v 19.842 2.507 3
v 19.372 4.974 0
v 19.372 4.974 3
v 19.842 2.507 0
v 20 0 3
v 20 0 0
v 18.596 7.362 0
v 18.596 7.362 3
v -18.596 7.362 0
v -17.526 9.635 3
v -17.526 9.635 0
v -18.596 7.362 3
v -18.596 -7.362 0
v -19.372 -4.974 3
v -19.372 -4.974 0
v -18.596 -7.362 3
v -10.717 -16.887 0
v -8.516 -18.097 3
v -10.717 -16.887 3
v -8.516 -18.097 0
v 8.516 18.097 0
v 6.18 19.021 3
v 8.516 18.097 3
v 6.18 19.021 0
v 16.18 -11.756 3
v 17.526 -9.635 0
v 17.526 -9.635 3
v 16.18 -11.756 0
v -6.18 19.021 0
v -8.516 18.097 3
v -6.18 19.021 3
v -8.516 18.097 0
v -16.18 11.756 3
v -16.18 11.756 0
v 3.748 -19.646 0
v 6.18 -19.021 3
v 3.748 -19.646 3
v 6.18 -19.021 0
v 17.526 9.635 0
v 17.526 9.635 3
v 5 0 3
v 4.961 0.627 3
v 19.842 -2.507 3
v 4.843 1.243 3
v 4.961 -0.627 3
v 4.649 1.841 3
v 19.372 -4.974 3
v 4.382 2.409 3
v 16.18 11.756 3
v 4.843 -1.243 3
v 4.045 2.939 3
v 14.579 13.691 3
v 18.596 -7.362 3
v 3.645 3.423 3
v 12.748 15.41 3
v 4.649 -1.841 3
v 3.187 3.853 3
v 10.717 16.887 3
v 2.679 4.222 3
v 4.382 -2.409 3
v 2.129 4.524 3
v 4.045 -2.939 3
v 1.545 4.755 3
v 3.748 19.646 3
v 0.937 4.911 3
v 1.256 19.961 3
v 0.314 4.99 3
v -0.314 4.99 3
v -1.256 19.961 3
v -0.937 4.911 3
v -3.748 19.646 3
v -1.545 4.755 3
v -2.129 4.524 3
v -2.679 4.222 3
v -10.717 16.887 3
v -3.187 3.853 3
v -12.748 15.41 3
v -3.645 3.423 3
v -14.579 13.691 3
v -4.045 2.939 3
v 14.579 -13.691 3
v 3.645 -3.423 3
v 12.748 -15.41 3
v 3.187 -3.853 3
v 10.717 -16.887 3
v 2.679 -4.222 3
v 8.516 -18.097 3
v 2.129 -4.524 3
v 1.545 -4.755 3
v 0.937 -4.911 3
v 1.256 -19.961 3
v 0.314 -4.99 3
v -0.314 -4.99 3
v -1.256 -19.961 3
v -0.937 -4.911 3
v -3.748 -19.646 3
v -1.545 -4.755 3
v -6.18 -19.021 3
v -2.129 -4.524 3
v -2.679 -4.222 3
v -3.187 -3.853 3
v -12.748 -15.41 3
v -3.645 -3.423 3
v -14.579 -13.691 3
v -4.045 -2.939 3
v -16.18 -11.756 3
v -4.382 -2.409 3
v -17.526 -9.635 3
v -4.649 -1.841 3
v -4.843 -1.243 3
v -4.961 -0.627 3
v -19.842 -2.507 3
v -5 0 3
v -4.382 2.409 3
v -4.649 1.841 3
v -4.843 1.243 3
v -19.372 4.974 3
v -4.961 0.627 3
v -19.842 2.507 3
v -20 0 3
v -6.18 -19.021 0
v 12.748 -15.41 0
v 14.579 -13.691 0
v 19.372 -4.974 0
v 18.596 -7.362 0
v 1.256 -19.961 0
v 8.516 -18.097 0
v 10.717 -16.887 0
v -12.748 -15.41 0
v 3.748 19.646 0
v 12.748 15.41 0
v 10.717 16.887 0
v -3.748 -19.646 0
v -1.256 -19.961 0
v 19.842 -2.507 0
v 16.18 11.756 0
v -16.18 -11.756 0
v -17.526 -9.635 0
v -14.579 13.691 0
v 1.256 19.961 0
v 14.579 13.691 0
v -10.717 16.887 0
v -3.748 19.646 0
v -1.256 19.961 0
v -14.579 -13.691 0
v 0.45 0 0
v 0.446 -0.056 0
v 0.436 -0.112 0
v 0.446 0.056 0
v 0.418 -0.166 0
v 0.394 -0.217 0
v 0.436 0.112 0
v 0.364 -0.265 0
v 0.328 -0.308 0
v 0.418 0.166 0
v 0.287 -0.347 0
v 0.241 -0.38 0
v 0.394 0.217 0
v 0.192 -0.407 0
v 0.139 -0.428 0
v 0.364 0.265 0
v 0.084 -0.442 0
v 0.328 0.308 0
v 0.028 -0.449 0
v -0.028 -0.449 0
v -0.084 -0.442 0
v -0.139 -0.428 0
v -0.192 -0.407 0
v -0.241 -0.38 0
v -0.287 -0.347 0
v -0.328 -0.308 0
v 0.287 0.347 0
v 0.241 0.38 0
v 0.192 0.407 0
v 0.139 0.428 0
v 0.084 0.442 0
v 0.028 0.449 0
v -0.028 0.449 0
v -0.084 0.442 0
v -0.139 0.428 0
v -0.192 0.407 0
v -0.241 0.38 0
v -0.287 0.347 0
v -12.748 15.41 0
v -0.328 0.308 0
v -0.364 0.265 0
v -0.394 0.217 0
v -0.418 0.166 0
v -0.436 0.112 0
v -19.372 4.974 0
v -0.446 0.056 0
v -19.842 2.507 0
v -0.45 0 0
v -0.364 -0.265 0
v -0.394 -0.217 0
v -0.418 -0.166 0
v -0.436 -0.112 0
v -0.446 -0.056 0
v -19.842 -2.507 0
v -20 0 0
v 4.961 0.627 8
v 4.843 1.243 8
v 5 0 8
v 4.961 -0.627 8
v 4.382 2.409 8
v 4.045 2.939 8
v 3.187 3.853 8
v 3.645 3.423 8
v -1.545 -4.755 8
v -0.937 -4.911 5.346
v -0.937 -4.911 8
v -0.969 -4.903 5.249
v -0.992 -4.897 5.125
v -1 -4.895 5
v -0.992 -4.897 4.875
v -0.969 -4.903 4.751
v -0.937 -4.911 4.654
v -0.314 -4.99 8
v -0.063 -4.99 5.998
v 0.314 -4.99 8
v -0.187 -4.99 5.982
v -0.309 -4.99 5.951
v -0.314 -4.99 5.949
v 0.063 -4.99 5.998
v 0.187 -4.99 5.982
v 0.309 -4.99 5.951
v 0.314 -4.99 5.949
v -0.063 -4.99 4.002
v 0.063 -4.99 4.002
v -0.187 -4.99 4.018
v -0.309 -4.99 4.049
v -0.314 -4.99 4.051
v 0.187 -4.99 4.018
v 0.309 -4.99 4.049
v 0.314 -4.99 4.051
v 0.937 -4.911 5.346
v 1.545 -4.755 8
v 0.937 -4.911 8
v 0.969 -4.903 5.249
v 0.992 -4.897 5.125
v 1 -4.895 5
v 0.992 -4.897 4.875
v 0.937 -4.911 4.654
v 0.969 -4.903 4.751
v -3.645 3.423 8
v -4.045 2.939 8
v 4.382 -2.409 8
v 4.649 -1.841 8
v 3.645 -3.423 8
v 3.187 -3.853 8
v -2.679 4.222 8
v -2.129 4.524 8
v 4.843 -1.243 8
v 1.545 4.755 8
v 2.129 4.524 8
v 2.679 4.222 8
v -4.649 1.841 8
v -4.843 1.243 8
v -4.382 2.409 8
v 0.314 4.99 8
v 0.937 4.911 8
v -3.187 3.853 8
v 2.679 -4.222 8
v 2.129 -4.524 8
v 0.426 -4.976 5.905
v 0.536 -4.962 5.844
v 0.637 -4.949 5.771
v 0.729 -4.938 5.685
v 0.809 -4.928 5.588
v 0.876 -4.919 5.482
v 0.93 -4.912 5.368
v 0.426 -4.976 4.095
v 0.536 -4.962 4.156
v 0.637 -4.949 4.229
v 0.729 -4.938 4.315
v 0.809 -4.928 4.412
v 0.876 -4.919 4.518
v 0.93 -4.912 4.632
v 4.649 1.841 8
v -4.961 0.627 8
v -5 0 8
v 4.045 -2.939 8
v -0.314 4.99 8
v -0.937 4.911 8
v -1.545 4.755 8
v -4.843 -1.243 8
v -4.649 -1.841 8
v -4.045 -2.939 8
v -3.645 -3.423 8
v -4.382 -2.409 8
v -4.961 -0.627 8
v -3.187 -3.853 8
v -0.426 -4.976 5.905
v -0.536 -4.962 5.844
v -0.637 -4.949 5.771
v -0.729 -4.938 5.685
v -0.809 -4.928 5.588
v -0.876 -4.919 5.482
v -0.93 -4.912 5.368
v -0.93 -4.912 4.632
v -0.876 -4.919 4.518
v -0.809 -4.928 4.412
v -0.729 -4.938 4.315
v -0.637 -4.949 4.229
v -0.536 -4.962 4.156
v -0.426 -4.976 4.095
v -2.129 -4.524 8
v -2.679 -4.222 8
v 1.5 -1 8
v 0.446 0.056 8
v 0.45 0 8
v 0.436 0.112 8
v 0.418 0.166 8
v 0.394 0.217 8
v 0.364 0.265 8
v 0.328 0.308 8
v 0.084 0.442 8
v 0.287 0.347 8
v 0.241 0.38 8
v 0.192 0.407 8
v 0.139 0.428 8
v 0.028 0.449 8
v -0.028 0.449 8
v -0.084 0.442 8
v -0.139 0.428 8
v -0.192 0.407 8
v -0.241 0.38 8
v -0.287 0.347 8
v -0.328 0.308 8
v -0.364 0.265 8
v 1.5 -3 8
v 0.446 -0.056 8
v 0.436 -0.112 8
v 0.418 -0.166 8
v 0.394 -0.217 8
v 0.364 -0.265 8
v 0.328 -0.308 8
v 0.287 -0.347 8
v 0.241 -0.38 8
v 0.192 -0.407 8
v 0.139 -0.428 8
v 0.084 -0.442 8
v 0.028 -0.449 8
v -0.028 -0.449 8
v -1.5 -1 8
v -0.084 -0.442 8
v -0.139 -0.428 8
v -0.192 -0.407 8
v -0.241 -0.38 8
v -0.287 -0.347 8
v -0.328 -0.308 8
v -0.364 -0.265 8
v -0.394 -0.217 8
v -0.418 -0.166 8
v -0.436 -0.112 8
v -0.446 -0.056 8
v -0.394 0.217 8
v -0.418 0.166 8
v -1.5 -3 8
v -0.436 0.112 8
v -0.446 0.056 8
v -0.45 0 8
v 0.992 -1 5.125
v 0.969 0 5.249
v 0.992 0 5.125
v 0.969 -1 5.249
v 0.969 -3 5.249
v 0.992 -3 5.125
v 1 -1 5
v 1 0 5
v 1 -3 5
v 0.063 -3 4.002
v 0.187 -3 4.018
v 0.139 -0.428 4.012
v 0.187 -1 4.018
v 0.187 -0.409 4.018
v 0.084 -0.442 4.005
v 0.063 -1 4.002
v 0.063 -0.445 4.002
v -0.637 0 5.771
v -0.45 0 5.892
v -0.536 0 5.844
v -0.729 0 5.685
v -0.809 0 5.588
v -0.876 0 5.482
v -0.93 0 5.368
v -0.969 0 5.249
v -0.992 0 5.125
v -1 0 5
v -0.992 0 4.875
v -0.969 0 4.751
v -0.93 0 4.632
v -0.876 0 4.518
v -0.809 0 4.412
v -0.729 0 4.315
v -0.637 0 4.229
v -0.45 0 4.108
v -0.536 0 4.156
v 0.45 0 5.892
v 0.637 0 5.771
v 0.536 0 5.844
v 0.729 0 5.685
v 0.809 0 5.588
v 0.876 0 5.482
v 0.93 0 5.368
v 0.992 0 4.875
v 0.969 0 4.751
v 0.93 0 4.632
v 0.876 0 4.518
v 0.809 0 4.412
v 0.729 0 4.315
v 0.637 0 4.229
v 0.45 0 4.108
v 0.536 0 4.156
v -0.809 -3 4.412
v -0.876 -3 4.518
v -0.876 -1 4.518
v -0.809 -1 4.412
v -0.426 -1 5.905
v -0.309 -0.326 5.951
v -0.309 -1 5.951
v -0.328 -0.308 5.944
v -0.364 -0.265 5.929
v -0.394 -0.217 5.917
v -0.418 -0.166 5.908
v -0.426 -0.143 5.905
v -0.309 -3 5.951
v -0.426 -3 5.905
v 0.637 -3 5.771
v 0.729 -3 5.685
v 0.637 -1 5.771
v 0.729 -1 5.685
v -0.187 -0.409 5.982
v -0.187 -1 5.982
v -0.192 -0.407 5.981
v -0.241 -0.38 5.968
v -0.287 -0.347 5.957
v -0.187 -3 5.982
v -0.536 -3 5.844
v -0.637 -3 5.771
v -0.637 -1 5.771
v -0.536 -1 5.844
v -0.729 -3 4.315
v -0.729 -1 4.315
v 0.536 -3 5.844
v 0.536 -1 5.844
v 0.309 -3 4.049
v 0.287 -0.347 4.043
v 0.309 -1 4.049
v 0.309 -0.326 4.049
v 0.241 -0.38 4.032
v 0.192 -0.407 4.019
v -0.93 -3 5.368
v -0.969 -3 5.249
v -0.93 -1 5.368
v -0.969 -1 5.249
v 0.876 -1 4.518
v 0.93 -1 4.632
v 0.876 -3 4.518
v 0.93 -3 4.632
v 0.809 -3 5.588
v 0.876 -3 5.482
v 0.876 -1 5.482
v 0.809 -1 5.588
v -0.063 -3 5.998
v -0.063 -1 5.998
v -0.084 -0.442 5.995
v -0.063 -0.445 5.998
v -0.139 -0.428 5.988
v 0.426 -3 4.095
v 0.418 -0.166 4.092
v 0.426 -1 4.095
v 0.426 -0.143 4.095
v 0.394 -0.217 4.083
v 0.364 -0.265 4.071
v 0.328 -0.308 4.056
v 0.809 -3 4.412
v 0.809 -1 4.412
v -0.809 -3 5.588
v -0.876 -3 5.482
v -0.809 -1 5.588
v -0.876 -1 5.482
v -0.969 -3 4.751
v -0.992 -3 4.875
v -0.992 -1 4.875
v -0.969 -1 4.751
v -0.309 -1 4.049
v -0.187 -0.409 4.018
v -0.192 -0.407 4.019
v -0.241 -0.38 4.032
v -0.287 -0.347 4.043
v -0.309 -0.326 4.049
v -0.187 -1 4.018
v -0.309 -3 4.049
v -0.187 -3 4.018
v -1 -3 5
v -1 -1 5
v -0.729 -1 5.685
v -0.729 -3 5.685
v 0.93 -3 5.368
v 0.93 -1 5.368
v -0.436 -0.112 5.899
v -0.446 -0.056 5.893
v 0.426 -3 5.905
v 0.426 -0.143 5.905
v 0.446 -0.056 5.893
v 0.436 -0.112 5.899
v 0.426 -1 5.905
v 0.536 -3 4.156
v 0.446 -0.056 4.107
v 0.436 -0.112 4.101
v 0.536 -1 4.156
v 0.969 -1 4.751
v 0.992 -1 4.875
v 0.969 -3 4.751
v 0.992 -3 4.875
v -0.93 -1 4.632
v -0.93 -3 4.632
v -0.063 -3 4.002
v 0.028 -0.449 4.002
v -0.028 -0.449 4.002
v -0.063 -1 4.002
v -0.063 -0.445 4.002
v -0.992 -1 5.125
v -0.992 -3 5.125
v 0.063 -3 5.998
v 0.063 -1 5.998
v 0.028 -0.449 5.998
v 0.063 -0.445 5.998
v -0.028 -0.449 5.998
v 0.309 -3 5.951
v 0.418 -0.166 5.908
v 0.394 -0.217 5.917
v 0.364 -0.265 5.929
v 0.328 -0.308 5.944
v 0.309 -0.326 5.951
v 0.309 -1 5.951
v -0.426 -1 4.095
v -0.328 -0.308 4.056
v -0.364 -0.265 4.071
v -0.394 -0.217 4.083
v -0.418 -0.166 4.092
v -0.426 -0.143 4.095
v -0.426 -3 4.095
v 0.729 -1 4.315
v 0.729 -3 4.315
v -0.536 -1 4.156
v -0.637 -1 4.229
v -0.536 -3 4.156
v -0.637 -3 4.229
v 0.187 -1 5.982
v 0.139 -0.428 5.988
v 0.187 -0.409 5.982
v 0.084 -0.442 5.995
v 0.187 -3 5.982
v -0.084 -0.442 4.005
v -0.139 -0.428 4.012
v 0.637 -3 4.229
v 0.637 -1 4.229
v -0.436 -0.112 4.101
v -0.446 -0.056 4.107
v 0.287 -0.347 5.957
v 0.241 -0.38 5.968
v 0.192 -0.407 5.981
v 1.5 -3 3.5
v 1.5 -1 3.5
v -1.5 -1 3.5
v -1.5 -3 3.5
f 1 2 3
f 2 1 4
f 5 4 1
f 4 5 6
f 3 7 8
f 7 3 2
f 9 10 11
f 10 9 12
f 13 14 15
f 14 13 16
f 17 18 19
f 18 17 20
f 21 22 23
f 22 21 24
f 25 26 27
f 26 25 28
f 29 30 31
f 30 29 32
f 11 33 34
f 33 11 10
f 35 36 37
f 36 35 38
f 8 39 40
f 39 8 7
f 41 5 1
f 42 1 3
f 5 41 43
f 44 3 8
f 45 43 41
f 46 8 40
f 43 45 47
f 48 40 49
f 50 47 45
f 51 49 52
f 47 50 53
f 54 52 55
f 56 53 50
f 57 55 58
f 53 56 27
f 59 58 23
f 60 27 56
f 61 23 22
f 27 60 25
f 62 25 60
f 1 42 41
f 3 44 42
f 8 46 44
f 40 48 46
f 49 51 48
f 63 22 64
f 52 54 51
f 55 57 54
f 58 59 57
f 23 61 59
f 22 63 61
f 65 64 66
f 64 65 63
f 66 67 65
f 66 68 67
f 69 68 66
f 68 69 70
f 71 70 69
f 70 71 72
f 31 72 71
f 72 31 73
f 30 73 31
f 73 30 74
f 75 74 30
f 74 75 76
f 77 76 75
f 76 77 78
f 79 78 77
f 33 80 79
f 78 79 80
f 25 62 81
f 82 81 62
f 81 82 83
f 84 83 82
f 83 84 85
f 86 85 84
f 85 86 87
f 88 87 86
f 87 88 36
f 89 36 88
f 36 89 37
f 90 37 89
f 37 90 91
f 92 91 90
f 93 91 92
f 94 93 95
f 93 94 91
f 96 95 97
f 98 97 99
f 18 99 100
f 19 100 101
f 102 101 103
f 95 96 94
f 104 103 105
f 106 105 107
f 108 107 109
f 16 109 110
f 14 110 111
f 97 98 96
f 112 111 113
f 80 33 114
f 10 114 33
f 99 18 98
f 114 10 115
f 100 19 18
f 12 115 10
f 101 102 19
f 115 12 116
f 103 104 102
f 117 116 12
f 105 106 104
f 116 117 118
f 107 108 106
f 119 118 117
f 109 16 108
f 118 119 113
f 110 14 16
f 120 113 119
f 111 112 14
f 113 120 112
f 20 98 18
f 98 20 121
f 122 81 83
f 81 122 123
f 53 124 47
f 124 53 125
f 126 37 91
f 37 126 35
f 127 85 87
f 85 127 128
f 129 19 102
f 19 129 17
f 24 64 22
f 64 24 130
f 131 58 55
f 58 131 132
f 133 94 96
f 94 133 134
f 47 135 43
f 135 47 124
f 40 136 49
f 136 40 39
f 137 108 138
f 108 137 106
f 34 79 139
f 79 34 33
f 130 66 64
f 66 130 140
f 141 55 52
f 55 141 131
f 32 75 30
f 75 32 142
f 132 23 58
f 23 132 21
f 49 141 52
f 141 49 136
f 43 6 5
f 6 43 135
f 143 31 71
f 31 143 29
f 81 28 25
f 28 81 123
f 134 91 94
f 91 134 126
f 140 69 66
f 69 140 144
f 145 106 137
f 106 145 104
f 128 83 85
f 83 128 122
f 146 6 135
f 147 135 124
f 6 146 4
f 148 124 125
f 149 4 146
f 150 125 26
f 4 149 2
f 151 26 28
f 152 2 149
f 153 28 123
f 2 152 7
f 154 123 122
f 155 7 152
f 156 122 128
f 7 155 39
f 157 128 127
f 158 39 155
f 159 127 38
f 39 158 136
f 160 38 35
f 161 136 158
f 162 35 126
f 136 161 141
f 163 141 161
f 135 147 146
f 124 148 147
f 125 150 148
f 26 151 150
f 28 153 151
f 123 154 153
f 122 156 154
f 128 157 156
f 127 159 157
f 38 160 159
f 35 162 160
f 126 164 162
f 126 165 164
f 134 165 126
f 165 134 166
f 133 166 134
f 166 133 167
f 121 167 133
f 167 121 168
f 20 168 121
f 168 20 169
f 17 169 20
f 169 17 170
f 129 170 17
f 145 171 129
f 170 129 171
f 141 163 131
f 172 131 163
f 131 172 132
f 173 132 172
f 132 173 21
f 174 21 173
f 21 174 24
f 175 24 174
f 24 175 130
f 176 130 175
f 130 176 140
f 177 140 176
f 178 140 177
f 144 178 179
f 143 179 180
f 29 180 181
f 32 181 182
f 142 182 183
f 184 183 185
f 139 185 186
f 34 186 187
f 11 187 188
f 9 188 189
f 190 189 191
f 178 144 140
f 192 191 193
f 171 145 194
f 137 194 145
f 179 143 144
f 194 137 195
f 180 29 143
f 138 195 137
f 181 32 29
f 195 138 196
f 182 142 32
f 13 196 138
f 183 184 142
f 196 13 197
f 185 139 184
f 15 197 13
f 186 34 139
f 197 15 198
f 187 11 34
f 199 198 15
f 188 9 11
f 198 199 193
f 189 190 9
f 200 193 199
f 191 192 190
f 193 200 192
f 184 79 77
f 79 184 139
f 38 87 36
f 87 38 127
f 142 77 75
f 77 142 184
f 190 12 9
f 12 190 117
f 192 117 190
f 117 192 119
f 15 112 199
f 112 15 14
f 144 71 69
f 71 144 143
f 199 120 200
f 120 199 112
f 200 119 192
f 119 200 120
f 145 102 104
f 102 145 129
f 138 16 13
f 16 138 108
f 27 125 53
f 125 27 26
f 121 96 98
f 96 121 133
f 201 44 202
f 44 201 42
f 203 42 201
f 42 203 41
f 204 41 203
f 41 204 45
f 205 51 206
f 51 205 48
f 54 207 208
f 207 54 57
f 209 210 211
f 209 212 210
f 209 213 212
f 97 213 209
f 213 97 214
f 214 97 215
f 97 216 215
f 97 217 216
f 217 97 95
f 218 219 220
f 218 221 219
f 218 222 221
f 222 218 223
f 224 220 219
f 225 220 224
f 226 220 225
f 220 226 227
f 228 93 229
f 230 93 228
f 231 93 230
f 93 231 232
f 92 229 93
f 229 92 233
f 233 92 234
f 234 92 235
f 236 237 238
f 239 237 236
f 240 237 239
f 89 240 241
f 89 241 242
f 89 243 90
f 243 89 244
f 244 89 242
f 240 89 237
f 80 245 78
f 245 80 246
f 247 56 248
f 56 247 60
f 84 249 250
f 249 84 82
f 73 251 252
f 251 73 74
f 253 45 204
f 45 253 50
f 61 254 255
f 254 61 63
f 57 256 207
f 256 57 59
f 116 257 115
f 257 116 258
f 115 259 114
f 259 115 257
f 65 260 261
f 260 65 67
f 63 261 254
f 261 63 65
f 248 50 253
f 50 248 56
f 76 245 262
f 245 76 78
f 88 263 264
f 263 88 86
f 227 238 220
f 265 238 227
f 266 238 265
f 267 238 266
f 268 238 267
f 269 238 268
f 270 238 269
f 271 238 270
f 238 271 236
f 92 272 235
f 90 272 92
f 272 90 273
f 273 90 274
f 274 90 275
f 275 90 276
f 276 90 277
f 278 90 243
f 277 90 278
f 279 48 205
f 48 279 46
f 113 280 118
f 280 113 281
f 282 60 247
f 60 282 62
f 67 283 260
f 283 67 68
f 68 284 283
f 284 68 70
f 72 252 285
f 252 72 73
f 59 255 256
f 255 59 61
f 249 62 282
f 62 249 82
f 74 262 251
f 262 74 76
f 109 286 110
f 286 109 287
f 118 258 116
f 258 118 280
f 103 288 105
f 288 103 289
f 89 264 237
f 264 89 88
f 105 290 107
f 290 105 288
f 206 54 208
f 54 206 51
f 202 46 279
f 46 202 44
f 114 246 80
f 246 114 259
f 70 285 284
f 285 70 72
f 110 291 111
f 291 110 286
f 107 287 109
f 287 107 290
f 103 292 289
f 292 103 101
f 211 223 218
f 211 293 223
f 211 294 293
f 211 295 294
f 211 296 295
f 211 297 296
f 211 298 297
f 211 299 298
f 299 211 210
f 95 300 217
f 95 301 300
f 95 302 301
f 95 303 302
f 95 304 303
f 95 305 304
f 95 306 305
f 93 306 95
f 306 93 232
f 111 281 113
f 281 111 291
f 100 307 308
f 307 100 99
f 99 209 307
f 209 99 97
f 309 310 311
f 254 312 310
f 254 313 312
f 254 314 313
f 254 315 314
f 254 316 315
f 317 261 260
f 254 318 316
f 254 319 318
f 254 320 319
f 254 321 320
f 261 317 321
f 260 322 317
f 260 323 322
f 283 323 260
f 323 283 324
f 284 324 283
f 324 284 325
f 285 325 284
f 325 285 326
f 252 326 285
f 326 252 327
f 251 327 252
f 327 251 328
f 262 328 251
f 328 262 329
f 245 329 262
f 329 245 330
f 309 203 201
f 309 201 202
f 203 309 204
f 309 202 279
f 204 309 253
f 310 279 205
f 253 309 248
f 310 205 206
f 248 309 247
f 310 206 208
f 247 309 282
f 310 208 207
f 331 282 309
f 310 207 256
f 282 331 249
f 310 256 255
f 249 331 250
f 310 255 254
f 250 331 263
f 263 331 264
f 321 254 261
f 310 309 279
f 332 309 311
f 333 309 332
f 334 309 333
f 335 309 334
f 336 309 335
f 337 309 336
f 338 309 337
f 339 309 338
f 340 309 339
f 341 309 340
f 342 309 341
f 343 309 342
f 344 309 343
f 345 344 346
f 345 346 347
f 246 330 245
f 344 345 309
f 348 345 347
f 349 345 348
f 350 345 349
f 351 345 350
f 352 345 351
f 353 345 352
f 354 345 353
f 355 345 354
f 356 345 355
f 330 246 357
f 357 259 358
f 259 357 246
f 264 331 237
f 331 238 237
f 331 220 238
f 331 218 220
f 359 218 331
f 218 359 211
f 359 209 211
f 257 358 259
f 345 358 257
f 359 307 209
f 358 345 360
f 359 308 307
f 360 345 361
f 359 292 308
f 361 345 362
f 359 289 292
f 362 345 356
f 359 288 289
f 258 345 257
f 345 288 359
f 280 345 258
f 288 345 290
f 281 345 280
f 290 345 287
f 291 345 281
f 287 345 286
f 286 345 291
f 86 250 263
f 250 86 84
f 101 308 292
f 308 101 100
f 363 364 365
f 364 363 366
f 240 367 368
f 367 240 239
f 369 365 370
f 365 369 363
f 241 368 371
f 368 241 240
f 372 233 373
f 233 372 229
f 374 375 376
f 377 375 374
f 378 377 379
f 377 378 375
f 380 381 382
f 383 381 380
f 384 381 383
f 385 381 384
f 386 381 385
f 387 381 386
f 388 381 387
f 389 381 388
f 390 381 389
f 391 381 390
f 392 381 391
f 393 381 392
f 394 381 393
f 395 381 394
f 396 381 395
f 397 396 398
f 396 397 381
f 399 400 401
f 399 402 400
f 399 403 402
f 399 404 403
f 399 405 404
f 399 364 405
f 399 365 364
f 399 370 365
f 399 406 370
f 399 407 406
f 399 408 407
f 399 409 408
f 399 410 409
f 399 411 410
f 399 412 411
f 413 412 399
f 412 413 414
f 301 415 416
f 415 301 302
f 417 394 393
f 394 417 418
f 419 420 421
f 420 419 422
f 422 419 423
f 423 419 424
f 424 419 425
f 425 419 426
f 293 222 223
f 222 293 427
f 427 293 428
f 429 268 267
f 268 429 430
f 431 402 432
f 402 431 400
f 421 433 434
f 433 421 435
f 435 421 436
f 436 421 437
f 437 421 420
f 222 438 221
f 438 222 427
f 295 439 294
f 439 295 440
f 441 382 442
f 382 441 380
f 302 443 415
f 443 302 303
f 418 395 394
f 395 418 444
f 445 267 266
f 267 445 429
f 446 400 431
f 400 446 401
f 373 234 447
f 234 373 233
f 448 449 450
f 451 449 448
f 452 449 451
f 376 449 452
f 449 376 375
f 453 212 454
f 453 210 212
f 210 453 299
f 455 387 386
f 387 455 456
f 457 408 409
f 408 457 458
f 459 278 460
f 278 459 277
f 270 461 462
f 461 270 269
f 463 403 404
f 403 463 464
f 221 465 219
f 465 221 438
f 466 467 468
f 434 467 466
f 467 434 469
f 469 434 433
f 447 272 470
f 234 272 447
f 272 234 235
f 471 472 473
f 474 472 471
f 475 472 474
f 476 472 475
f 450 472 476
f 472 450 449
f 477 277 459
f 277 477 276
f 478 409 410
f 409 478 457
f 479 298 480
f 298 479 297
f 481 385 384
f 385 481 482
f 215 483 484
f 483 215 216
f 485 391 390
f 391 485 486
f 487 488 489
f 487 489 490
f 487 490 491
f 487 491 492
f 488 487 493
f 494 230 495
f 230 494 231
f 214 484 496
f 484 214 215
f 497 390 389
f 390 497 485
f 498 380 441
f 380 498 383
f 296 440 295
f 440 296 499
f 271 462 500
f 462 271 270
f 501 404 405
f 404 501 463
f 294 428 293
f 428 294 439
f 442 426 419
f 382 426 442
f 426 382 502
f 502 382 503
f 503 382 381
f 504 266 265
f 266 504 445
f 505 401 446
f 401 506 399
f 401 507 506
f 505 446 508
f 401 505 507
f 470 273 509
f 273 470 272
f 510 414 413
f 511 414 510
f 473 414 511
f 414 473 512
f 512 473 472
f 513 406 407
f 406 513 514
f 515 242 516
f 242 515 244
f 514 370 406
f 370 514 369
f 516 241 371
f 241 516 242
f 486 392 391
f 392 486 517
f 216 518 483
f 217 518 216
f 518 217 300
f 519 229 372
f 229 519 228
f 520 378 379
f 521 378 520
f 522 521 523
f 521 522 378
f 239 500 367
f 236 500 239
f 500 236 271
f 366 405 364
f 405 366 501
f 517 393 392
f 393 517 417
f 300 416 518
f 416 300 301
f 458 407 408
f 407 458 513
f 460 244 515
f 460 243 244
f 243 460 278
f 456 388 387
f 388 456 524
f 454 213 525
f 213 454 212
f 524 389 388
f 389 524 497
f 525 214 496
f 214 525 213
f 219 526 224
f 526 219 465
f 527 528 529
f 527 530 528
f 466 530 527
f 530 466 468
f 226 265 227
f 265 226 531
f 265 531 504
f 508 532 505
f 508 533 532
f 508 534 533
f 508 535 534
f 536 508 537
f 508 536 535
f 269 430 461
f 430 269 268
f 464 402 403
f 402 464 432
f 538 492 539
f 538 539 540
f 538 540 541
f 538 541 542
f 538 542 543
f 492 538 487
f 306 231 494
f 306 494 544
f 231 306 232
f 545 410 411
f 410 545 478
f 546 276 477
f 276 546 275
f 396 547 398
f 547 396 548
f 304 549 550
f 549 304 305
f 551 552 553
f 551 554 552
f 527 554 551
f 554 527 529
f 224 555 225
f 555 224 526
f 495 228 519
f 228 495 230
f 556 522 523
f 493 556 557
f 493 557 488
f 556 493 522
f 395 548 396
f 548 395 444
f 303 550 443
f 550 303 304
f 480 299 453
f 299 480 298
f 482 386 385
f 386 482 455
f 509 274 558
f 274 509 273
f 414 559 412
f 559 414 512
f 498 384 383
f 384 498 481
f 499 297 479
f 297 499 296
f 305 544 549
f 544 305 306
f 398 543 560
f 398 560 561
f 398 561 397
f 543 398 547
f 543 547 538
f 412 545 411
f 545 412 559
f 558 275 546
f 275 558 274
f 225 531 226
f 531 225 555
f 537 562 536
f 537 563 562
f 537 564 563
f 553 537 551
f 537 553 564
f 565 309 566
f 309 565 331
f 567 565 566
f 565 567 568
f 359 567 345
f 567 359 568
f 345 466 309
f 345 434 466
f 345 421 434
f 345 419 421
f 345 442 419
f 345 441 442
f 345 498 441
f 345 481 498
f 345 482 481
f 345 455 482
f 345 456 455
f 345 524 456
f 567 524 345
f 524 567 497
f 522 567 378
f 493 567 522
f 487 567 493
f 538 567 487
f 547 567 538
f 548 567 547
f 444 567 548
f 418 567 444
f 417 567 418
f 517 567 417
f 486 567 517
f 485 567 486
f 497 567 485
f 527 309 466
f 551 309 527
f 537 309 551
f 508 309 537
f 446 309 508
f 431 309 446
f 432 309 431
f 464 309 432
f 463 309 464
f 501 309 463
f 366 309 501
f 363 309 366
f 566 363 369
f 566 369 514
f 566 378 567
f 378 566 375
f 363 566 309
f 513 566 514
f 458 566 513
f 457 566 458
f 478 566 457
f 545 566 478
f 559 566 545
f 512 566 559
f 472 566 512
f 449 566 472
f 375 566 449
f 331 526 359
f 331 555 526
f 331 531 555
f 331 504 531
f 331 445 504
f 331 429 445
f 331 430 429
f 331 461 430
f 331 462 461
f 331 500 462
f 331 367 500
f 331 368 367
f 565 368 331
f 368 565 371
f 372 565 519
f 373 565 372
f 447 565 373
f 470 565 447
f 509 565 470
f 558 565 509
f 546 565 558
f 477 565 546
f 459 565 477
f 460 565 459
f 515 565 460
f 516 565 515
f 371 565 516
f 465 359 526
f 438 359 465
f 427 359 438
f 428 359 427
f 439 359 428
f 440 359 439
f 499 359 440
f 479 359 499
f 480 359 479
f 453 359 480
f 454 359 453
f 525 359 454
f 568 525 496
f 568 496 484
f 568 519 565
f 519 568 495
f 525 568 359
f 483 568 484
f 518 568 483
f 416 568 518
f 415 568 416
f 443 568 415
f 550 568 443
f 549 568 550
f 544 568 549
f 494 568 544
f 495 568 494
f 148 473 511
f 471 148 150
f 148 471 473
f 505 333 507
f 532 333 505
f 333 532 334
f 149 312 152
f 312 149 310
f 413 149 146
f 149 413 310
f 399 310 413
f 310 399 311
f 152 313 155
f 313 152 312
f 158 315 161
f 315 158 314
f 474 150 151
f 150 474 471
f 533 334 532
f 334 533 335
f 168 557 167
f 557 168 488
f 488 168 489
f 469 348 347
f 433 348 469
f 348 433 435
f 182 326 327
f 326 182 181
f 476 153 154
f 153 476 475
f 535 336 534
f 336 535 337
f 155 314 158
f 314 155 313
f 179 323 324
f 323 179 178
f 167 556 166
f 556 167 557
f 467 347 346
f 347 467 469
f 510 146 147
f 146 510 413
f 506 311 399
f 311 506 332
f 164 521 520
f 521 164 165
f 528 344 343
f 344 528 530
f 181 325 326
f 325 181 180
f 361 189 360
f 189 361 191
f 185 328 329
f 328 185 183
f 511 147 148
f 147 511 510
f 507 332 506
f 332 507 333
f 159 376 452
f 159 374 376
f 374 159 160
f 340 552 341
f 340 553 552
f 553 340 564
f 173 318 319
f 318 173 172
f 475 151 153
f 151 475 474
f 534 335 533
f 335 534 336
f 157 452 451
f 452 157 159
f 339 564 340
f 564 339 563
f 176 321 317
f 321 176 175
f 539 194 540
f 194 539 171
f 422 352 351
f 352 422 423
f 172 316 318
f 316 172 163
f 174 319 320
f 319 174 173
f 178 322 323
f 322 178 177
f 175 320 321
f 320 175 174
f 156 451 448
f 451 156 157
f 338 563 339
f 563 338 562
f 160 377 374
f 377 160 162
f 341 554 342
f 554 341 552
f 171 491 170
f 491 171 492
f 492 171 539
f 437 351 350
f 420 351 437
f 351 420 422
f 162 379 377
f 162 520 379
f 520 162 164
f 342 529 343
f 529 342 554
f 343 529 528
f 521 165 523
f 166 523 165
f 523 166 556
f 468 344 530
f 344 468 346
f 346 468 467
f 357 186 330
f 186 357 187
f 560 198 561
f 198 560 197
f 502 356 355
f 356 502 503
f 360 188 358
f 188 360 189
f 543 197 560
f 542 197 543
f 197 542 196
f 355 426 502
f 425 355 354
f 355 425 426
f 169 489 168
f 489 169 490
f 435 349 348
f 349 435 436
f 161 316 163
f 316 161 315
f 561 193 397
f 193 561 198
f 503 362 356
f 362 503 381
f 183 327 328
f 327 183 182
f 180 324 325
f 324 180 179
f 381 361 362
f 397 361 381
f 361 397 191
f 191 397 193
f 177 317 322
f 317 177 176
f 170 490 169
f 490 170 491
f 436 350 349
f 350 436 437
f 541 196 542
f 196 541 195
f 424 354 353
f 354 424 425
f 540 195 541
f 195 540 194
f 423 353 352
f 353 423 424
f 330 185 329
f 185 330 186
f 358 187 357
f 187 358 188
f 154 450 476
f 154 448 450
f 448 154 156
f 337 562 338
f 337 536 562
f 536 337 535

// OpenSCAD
$fn = 50;
inf = 9999;

difference() {
  union() {
    cylinder(r = 20, h = 3);
    cylinder(r = 5, h = 8);
  }
  cylinder(d = 0.9, h = inf);
  translate([ 0, 0, 5 ]) {
    rotate([ 90, 0, 0 ]) cylinder(d = 2, h = inf);
    translate([ 0, -2, 3 ]) cube([ 3, 2, 9 ], center = true);
  }
}
